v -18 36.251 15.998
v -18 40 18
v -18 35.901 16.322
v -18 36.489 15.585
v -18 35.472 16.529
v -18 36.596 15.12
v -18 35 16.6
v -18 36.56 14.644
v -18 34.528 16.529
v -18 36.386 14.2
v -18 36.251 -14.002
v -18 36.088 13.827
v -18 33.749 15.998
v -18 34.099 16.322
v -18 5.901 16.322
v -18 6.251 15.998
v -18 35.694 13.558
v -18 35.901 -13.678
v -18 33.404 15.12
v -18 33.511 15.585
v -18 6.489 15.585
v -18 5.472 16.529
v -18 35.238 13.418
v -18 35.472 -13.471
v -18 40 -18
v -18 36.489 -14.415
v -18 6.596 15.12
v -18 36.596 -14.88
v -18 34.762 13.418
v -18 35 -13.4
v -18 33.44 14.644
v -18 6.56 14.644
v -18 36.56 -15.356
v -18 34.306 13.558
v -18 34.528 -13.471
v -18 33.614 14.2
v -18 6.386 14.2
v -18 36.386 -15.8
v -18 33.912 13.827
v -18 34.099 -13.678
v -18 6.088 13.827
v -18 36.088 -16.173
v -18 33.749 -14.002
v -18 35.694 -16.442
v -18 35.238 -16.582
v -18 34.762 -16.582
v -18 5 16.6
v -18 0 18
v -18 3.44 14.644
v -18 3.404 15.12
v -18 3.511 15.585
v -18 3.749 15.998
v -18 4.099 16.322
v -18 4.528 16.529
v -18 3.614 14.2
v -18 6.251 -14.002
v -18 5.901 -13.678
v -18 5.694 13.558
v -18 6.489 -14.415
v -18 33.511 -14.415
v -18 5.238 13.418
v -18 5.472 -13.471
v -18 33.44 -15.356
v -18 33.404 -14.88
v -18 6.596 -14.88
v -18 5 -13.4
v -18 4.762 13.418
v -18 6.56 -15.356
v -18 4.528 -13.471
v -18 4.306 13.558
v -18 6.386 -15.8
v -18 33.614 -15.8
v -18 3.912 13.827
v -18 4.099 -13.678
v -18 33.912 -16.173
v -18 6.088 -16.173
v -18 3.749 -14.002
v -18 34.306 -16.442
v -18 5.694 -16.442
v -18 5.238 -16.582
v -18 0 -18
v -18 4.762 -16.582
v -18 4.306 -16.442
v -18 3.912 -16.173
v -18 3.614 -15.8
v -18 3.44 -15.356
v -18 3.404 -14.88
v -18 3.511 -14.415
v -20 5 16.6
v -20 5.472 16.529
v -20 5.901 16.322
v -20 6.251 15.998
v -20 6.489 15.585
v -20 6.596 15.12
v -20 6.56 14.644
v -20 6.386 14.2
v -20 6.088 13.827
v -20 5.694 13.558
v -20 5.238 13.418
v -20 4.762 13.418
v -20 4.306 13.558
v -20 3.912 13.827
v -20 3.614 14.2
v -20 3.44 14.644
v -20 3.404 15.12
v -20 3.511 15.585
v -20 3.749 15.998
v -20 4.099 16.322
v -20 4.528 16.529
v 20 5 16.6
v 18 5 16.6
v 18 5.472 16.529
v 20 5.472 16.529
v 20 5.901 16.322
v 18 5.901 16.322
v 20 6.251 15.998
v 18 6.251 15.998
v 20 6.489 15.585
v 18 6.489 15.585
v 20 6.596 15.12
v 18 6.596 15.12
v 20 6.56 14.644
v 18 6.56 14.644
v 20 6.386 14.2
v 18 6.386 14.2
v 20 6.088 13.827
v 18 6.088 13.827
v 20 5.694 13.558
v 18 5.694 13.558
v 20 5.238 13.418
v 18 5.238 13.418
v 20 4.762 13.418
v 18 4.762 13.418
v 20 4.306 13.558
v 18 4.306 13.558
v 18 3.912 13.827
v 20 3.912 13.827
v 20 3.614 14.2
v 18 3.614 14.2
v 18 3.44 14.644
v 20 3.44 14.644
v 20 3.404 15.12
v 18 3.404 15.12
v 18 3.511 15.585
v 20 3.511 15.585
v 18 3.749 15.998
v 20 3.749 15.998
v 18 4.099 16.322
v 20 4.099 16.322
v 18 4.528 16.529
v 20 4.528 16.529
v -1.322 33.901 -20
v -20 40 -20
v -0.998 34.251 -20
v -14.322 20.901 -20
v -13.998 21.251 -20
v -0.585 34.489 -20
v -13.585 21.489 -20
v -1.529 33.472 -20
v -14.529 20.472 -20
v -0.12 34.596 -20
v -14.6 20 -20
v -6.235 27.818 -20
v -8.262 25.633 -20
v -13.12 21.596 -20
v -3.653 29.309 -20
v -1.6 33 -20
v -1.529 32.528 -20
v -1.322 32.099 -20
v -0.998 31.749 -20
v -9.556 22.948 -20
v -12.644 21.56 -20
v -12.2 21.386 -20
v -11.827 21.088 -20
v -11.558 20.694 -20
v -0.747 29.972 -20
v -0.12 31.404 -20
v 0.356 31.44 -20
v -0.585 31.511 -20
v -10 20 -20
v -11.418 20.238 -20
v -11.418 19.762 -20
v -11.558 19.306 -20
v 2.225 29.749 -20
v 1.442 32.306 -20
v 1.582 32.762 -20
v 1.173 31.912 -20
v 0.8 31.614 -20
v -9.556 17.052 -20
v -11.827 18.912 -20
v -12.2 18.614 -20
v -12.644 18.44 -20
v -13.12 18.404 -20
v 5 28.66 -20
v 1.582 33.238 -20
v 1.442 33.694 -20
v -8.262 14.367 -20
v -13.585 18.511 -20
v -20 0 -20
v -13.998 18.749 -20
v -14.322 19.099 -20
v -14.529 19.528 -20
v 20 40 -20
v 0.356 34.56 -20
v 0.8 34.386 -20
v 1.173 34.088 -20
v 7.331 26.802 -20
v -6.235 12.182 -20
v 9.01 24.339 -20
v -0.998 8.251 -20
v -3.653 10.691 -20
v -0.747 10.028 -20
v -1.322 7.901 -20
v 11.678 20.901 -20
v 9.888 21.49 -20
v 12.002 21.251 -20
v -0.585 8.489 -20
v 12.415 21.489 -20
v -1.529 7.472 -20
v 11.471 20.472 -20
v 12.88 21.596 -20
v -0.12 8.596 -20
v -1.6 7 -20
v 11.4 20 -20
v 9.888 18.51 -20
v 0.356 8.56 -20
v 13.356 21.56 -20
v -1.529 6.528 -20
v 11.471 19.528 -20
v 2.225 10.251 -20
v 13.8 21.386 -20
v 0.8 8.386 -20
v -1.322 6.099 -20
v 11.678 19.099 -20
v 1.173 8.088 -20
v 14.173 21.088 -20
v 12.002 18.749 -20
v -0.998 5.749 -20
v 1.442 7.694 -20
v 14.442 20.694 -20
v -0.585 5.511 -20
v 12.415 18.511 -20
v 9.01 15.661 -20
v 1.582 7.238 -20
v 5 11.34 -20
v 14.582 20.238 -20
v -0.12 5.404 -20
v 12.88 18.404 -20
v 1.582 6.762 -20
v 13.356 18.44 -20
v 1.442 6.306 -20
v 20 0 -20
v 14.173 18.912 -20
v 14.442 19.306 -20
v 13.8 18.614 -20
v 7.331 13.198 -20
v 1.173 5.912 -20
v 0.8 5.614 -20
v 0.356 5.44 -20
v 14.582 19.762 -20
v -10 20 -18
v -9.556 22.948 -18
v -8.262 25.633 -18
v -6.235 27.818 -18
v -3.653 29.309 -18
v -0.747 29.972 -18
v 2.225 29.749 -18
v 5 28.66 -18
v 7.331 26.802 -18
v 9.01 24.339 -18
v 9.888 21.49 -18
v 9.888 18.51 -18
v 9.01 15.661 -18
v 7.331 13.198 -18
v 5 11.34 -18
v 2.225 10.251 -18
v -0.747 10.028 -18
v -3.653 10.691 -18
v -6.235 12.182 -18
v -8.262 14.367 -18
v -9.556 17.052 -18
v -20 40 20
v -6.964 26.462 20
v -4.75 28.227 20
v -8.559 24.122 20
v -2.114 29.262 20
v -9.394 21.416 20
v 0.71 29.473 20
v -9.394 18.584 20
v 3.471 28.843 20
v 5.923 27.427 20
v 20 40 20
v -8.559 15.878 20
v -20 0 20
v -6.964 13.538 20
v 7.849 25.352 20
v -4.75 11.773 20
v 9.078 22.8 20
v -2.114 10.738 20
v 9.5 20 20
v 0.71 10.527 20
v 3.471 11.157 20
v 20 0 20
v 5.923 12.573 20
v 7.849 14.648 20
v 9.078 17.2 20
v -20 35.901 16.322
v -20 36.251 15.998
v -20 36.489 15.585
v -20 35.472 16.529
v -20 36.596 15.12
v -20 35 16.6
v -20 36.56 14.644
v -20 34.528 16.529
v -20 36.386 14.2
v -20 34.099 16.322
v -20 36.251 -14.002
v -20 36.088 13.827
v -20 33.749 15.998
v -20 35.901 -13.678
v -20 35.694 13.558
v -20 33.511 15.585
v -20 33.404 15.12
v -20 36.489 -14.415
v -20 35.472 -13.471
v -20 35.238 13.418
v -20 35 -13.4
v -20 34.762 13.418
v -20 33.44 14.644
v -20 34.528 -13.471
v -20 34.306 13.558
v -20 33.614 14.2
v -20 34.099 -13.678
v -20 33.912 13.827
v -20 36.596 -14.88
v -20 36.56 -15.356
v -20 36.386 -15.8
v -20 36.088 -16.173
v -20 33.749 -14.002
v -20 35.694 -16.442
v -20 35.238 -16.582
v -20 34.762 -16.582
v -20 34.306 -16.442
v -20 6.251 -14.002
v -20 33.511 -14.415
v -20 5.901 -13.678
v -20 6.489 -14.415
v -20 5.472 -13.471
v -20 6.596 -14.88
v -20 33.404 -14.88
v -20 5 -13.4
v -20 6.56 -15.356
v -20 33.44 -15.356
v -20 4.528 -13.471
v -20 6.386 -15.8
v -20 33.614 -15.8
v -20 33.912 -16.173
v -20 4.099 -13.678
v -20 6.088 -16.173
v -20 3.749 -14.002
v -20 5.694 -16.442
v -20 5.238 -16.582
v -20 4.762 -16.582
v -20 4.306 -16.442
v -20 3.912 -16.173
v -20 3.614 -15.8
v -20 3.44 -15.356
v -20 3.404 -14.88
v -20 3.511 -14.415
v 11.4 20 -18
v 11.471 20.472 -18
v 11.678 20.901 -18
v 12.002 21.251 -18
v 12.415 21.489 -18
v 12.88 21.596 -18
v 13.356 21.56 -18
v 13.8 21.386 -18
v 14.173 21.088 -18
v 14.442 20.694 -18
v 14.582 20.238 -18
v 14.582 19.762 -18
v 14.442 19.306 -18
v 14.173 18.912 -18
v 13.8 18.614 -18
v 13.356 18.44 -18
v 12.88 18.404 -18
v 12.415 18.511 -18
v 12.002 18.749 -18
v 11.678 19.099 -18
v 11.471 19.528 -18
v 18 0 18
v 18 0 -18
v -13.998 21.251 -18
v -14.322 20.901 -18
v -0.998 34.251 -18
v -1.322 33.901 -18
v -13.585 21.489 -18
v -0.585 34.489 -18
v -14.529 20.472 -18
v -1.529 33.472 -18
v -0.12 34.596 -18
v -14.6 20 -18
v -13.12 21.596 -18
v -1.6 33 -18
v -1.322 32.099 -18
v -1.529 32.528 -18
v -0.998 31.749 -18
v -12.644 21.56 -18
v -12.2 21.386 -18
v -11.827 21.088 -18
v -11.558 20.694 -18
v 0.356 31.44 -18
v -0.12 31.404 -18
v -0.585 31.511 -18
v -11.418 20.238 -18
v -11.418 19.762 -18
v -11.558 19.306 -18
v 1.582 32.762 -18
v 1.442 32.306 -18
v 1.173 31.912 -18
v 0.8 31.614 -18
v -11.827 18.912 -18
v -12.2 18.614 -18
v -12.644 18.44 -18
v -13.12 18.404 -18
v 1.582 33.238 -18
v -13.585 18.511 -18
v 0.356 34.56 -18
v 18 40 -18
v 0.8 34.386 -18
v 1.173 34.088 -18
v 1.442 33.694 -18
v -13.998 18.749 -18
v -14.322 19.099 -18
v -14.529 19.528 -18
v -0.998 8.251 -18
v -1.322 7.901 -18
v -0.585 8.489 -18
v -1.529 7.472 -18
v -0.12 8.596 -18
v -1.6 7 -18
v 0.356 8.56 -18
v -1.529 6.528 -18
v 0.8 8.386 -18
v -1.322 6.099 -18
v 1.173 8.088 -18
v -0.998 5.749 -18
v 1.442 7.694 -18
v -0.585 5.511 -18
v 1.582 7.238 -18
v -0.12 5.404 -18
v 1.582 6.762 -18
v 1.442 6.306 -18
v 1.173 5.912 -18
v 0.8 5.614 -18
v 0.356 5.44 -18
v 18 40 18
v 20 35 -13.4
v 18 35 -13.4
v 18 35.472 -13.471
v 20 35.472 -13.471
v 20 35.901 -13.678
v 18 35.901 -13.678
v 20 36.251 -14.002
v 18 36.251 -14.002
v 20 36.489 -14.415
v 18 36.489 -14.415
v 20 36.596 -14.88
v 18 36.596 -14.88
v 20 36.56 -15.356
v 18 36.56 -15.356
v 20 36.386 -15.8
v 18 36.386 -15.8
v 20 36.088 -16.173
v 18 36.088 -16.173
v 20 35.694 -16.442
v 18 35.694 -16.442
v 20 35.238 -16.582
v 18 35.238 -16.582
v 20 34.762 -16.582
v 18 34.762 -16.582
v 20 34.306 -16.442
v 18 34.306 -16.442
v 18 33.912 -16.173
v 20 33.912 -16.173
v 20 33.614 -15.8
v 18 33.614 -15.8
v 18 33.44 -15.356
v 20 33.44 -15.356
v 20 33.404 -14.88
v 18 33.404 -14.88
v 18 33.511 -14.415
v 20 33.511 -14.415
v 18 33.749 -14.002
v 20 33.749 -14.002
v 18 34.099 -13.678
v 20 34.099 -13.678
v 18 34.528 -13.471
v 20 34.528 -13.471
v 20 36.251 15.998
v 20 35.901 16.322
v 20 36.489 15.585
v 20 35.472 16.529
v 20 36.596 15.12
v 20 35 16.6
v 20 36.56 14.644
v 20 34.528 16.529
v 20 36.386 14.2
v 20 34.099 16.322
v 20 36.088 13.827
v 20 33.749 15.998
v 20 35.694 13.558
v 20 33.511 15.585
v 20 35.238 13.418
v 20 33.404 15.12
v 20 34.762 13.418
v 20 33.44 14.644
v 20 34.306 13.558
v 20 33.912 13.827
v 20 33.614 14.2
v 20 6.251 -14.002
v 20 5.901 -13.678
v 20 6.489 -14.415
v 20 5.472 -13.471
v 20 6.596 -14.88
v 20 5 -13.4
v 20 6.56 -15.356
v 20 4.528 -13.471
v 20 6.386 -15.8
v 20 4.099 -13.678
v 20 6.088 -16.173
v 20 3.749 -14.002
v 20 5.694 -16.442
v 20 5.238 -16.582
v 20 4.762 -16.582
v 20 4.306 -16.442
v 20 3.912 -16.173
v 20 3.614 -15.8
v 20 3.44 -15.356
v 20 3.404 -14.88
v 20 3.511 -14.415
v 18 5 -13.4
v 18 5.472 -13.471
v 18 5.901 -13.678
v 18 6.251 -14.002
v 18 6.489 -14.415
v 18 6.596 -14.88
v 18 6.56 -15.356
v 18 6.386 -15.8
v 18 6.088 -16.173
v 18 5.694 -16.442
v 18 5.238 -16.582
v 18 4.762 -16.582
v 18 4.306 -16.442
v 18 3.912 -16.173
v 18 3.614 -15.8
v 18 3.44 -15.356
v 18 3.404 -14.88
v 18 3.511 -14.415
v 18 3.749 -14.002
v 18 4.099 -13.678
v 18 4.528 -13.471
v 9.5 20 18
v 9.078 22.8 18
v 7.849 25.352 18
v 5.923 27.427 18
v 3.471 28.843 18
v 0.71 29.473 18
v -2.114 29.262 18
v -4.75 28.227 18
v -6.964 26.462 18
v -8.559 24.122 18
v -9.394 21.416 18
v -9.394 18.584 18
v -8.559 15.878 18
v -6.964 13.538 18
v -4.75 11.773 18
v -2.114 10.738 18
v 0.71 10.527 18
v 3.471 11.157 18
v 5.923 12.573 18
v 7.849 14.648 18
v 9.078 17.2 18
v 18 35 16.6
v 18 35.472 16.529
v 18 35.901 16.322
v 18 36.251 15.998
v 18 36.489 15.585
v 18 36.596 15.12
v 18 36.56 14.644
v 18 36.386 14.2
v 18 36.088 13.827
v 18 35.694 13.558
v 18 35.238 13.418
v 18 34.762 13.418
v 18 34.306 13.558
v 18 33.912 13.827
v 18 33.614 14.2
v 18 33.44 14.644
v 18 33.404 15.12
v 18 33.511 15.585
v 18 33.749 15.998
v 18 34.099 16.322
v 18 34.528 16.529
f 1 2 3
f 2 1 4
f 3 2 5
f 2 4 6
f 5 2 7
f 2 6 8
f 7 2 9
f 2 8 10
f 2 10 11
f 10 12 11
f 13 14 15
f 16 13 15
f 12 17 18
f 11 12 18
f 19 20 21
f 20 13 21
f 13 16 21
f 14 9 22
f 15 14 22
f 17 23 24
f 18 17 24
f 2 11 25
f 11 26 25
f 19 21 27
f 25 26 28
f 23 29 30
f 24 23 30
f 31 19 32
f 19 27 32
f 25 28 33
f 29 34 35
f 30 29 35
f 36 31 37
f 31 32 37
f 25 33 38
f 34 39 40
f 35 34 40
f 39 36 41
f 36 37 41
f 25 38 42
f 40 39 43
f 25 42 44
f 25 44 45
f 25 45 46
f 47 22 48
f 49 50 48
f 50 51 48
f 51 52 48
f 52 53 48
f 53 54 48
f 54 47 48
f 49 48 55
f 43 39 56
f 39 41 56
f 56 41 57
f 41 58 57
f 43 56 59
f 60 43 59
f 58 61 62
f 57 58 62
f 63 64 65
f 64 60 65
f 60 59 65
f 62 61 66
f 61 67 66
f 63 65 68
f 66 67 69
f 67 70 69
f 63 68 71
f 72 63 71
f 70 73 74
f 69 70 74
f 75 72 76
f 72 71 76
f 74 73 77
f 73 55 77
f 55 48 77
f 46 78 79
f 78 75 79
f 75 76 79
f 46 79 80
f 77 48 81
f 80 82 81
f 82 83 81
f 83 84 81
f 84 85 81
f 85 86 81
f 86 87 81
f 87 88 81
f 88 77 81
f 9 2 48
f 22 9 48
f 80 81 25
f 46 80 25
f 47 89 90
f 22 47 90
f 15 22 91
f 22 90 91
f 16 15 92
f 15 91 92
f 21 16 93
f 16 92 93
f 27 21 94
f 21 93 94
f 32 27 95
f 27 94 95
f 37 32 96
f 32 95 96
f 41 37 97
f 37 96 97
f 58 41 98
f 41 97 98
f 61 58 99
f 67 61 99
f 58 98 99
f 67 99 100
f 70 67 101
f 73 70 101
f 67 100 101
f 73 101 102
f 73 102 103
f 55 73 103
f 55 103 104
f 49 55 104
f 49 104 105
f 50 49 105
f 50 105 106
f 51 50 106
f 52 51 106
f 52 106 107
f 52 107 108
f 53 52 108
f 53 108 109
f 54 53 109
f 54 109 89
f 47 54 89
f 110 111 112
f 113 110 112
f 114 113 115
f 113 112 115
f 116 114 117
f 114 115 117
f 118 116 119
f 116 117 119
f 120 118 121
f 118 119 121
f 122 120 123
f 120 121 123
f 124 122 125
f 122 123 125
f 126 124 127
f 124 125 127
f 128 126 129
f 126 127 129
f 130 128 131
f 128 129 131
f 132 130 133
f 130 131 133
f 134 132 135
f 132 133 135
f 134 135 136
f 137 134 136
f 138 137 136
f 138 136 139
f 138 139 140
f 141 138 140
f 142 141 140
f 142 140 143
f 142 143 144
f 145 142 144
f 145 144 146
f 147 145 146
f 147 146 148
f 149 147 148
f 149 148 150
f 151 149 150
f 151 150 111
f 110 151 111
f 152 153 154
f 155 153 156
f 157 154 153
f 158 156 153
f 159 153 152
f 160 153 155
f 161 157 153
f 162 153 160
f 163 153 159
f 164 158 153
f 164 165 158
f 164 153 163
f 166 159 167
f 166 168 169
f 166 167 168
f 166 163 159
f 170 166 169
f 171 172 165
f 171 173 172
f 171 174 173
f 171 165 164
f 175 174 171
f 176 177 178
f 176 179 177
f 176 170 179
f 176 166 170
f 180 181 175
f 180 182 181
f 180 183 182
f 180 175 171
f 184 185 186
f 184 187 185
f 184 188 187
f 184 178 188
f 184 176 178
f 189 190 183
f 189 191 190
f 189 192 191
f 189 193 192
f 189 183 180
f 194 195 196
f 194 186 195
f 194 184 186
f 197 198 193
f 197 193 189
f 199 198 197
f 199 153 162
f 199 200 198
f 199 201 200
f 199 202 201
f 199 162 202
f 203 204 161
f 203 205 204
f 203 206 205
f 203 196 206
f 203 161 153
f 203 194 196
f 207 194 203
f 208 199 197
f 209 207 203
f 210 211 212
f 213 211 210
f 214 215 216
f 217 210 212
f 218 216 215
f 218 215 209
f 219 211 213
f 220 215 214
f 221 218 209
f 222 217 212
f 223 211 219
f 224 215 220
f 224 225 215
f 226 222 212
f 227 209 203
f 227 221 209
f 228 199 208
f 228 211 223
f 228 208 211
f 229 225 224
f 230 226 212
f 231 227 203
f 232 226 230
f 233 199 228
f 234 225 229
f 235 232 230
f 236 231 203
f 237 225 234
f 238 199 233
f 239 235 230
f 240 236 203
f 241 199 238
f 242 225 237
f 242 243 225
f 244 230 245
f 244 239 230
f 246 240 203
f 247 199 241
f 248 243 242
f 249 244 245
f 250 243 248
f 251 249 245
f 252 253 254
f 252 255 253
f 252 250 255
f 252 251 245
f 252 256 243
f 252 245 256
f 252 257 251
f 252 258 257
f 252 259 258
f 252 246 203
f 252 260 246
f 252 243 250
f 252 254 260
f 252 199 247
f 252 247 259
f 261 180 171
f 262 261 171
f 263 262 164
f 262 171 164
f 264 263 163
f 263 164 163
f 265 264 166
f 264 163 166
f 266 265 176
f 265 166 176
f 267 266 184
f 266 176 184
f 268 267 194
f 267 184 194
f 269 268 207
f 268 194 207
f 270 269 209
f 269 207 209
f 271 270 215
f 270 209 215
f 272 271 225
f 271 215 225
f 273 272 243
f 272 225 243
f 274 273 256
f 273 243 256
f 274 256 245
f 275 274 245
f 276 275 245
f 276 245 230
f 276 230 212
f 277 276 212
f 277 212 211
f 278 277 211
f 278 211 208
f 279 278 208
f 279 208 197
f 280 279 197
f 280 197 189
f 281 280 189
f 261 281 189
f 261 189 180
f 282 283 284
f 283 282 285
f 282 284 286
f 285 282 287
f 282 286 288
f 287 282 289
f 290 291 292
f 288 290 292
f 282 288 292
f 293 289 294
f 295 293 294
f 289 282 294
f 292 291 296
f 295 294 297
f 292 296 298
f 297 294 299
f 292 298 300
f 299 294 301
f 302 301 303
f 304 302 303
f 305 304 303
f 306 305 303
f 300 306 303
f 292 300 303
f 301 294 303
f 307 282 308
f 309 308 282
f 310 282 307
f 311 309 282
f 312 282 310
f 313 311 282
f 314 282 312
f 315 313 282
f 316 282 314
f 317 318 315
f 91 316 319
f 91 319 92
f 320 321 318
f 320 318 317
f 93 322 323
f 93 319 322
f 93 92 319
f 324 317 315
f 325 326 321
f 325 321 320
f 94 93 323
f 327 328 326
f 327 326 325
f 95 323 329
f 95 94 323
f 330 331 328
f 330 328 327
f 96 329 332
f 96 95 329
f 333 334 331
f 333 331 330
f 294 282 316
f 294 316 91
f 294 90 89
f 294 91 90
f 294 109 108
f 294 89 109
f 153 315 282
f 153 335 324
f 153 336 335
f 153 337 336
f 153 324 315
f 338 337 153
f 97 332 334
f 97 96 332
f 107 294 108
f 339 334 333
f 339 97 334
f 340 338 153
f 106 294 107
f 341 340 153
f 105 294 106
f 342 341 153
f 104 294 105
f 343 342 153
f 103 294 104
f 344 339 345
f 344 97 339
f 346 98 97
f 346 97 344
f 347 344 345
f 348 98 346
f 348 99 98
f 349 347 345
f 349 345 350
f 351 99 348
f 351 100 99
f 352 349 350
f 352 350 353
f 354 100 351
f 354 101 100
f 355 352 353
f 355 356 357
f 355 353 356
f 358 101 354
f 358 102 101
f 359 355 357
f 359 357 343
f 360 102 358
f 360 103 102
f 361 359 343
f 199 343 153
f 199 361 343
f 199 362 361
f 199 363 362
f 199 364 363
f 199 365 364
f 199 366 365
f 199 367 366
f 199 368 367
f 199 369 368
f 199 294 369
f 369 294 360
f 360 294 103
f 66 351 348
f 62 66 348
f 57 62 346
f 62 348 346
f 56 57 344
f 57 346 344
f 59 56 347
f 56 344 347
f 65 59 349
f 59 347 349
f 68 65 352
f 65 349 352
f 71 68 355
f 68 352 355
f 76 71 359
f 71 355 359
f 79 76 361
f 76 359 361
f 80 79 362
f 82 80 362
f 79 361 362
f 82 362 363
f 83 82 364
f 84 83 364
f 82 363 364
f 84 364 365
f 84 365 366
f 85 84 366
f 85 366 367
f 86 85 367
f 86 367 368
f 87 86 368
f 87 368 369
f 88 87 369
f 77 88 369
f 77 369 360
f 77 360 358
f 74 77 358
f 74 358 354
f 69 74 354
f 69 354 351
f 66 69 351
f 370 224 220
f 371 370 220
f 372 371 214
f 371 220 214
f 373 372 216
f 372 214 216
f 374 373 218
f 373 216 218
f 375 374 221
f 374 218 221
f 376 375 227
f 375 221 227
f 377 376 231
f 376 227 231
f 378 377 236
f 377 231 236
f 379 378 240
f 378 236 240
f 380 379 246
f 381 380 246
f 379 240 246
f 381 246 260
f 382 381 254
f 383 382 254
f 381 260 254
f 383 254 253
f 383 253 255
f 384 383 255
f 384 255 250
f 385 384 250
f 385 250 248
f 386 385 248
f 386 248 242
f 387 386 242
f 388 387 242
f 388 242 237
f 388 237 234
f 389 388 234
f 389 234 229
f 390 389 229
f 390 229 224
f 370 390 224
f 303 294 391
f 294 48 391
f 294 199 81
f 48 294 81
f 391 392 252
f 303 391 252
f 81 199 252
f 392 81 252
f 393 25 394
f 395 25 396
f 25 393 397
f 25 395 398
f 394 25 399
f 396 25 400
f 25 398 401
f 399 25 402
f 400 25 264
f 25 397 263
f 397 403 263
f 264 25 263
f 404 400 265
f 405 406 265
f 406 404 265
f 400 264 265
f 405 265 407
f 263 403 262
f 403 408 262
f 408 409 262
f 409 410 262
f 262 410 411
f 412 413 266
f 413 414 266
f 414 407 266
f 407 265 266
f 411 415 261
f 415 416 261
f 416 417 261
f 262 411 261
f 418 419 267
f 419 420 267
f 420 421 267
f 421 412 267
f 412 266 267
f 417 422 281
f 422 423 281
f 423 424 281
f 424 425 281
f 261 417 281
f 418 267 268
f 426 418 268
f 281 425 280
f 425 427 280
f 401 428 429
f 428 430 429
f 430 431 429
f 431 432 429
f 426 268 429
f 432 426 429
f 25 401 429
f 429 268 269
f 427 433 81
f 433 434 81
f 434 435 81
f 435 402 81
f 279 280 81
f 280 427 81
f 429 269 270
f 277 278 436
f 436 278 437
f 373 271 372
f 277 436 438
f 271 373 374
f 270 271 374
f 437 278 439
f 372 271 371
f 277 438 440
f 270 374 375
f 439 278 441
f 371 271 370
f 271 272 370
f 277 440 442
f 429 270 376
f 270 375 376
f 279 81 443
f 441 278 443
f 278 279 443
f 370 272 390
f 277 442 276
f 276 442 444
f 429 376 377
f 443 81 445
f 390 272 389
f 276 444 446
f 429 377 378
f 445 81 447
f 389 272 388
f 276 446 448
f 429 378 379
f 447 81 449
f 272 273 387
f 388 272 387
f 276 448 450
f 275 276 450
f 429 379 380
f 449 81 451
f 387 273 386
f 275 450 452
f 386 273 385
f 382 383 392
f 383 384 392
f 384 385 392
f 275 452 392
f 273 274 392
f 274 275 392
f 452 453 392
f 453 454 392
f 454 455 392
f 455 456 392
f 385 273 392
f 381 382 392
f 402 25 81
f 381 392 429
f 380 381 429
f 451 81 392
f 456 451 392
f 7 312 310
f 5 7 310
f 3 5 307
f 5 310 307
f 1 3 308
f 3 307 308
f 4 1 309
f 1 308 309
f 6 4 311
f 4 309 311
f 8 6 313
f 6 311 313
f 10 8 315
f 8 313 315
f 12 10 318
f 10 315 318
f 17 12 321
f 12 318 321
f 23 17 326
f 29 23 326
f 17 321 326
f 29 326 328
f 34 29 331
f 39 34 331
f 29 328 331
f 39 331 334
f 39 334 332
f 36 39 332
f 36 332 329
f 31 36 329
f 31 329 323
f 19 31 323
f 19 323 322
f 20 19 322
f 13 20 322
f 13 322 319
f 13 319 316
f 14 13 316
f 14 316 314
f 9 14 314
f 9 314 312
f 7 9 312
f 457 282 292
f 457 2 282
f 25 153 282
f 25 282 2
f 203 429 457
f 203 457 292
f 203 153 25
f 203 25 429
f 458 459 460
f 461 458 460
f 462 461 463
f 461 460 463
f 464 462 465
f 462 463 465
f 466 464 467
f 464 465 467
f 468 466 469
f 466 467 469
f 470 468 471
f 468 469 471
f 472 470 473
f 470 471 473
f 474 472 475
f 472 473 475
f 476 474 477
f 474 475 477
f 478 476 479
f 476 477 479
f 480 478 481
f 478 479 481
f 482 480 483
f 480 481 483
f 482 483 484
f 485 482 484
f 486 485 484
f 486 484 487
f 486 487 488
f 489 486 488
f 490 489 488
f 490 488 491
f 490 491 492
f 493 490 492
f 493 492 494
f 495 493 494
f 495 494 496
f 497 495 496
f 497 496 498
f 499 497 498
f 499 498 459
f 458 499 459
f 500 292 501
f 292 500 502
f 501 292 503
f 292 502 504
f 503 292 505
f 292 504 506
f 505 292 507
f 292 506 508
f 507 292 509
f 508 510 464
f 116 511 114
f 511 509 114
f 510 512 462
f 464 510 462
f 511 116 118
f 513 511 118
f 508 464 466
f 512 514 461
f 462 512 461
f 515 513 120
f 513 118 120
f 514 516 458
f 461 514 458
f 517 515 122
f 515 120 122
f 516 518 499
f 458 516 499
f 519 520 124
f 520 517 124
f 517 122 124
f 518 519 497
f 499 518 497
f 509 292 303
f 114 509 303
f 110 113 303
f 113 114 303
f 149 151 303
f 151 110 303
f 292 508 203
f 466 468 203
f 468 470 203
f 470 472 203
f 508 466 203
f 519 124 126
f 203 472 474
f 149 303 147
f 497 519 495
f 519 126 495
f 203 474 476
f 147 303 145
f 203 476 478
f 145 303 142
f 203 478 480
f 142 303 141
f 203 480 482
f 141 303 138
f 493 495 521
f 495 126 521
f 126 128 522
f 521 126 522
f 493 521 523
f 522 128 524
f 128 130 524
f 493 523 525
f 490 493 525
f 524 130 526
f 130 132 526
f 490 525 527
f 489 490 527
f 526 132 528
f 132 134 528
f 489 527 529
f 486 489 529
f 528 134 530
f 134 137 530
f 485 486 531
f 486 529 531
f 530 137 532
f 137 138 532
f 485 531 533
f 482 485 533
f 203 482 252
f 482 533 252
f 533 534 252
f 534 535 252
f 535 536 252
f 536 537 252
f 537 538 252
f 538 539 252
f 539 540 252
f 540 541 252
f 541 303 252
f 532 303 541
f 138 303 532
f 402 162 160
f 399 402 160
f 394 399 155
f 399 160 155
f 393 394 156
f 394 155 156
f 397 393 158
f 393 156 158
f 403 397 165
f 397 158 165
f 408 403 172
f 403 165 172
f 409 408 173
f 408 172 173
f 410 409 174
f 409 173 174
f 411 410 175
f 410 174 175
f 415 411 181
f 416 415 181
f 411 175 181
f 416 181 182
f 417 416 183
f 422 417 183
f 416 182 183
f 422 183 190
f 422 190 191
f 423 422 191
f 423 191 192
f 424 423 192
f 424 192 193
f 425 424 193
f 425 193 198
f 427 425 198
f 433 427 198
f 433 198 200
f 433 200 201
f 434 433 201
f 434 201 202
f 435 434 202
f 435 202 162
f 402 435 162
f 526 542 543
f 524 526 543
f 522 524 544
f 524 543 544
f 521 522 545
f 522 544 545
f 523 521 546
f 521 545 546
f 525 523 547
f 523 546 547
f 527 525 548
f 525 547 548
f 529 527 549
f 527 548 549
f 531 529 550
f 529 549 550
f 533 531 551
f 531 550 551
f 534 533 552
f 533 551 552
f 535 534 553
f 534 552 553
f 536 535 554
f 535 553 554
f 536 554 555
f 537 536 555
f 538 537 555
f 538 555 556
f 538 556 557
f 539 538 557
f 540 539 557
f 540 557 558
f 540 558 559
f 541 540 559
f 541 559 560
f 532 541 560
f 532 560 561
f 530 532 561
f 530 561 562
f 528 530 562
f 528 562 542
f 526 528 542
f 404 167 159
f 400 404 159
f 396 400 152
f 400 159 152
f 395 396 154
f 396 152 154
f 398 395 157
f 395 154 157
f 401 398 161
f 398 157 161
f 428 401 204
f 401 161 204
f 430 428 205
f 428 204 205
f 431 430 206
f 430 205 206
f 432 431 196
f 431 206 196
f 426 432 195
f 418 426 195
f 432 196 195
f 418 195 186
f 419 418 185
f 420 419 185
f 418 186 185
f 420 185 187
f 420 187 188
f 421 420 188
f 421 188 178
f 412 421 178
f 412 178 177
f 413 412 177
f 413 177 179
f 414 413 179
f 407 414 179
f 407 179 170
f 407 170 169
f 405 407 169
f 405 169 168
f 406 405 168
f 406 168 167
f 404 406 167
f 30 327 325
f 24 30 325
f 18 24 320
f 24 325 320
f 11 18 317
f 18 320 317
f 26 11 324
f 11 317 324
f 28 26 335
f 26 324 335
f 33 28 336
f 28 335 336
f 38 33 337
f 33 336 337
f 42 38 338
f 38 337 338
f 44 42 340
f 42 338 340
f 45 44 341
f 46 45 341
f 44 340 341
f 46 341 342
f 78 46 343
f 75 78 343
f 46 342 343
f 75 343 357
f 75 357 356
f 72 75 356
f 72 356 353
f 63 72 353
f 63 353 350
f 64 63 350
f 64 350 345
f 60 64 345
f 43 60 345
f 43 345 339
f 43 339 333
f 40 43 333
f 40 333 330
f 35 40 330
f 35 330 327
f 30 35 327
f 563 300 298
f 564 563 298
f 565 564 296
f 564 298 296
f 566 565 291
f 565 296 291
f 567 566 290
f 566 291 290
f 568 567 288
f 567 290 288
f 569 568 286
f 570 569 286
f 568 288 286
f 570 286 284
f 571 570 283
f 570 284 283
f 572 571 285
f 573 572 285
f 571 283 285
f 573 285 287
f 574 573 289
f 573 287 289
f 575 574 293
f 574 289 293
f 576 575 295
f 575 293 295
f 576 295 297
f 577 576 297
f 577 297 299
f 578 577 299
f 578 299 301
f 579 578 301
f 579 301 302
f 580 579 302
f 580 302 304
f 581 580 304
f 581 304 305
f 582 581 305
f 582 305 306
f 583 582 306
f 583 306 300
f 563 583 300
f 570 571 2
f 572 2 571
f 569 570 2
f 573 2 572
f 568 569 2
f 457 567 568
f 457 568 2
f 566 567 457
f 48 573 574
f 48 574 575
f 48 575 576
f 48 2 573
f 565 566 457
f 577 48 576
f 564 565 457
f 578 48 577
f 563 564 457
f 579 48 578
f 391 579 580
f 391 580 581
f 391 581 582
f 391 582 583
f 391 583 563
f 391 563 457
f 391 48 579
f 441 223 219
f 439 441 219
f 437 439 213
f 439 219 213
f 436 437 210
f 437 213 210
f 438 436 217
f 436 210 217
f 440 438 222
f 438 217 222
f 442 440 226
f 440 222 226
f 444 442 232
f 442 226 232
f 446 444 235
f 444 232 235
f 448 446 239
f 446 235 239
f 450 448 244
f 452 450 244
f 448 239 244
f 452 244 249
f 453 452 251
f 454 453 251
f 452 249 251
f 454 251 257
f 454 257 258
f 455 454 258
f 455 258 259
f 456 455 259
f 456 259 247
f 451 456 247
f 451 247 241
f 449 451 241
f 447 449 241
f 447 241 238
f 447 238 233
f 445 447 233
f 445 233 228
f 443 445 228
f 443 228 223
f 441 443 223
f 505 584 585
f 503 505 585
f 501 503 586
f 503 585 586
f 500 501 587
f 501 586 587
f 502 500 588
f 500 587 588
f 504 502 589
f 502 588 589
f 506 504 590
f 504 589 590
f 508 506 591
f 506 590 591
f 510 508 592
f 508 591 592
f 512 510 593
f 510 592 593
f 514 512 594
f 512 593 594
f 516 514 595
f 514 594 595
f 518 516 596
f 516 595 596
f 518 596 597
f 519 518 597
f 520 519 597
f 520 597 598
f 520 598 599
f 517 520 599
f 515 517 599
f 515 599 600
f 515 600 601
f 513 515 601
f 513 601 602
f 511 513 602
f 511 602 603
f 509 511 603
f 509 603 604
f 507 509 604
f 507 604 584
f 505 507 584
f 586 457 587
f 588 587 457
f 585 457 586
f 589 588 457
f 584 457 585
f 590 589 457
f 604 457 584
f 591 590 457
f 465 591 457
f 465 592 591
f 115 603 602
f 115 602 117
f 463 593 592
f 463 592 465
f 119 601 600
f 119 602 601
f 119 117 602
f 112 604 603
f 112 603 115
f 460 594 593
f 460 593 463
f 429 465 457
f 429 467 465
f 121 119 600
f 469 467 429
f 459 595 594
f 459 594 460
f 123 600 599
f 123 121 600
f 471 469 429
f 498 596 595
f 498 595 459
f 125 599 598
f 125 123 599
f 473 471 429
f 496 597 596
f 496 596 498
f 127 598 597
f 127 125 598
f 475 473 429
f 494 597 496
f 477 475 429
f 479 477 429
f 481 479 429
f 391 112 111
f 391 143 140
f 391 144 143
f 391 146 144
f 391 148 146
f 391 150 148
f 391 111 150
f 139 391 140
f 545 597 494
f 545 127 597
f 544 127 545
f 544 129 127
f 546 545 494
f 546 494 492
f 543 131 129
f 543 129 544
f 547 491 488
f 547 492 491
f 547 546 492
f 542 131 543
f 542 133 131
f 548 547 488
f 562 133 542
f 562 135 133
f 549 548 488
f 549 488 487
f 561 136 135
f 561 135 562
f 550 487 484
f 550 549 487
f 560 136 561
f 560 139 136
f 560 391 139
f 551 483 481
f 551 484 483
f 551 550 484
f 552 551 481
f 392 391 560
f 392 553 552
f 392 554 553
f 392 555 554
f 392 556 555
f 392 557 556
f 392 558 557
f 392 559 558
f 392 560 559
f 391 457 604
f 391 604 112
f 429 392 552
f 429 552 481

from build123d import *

# Parameters (mm, degrees)
SKETCH_1_W          = 40
SKETCH_1_H          = 40
SKETCH_1_W_2        = 36
SKETCH_1_H_2        = 36
EXTRUDE_1_DEPTH     = 40
CUT_EXTRUDE_1_REACH = 62
SKETCH_2_R          = 10
SKETCH_2_R_2        = 1.6
CUT_EXTRUDE_2_REACH = 62
SKETCH_3_R          = 9.5
SKETCH_4_R          = 1.6
CUT_EXTRUDE_3_DEPTH = 61


with BuildPart() as part:
    # ｽｹｯﾁ1 → ﾎﾞｽ - 押し出し1 (new body)
    with BuildSketch(Plane(origin=(0, 0, 0), x_dir=(1, 0, 0), z_dir=(0, 1, 0))):
        Rectangle(SKETCH_1_W, SKETCH_1_H)
        Rectangle(SKETCH_1_W_2, SKETCH_1_H_2, mode=Mode.SUBTRACT)
    extrude(amount=EXTRUDE_1_DEPTH)

    # ｽｹｯﾁ2 → ｶｯﾄ - 押し出し1 (cut, up to next)
    with BuildSketch(Plane(origin=(0, 0, -20), x_dir=(-1, 0, 0), z_dir=(0, 0, -1)), mode=Mode.PRIVATE) as cut_extrude_1_sk1:
        with Locations((0, 20)):
            Circle(SKETCH_2_R)
    cut_extrude_1_tool1 = extrude(cut_extrude_1_sk1.sketch, amount=-CUT_EXTRUDE_1_REACH, mode=Mode.PRIVATE) & part.part
    # ｽｹｯﾁ2 → ｶｯﾄ - 押し出し1 (cut, up to next)
    with BuildSketch(Plane(origin=(0, 0, -20), x_dir=(-1, 0, 0), z_dir=(0, 0, -1)), mode=Mode.PRIVATE) as cut_extrude_1_sk2:
        with Locations((0, 33)):
            Circle(SKETCH_2_R_2)
    cut_extrude_1_tool2 = extrude(cut_extrude_1_sk2.sketch, amount=-CUT_EXTRUDE_1_REACH, mode=Mode.PRIVATE) & part.part
    # ｽｹｯﾁ2 → ｶｯﾄ - 押し出し1 (cut, up to next)
    with BuildSketch(Plane(origin=(0, 0, -20), x_dir=(-1, 0, 0), z_dir=(0, 0, -1)), mode=Mode.PRIVATE) as cut_extrude_1_sk3:
        with Locations((13, 20)):
            Circle(SKETCH_2_R_2)
    cut_extrude_1_tool3 = extrude(cut_extrude_1_sk3.sketch, amount=-CUT_EXTRUDE_1_REACH, mode=Mode.PRIVATE) & part.part
    # ｽｹｯﾁ2 → ｶｯﾄ - 押し出し1 (cut, up to next)
    with BuildSketch(Plane(origin=(0, 0, -20), x_dir=(-1, 0, 0), z_dir=(0, 0, -1)), mode=Mode.PRIVATE) as cut_extrude_1_sk4:
        with Locations((0, 7)):
            Circle(SKETCH_2_R_2)
    cut_extrude_1_tool4 = extrude(cut_extrude_1_sk4.sketch, amount=-CUT_EXTRUDE_1_REACH, mode=Mode.PRIVATE) & part.part
    # ｽｹｯﾁ2 → ｶｯﾄ - 押し出し1 (cut, up to next)
    with BuildSketch(Plane(origin=(0, 0, -20), x_dir=(-1, 0, 0), z_dir=(0, 0, -1)), mode=Mode.PRIVATE) as cut_extrude_1_sk5:
        with Locations((-13, 20)):
            Circle(SKETCH_2_R_2)
    cut_extrude_1_tool5 = extrude(cut_extrude_1_sk5.sketch, amount=-CUT_EXTRUDE_1_REACH, mode=Mode.PRIVATE) & part.part
    add(cut_extrude_1_tool1.solids().sort_by_distance((0, 20, -20))[0], mode=Mode.SUBTRACT)
    add(cut_extrude_1_tool2.solids().sort_by_distance((0, 33, -20))[0], mode=Mode.SUBTRACT)
    add(cut_extrude_1_tool3.solids().sort_by_distance((-13, 20, -20))[0], mode=Mode.SUBTRACT)
    add(cut_extrude_1_tool4.solids().sort_by_distance((0, 7, -20))[0], mode=Mode.SUBTRACT)
    add(cut_extrude_1_tool5.solids().sort_by_distance((13, 20, -20))[0], mode=Mode.SUBTRACT)

    # ｽｹｯﾁ3 → ｶｯﾄ - 押し出し2 (cut, up to next)
    with BuildSketch(Plane.XY.offset(20), mode=Mode.PRIVATE) as cut_extrude_2_sk1:
        with Locations((0, 20)):
            Circle(SKETCH_3_R)
    cut_extrude_2_tool1 = extrude(cut_extrude_2_sk1.sketch, amount=-CUT_EXTRUDE_2_REACH, mode=Mode.PRIVATE) & part.part
    add(cut_extrude_2_tool1.solids().sort_by_distance((0, 20, 20))[0], mode=Mode.SUBTRACT)

    # ｽｹｯﾁ4 → ｶｯﾄ - 押し出し3 (cut, through all)
    with BuildSketch(Plane.ZY.offset(20)):
        with Locations((15, 5)):
            Circle(SKETCH_4_R)
        with Locations((-15, 5)):
            Circle(SKETCH_4_R)
        with Locations((15, 35)):
            Circle(SKETCH_4_R)
        with Locations((-15, 35)):
            Circle(SKETCH_4_R)
    extrude(amount=-CUT_EXTRUDE_3_DEPTH, mode=Mode.SUBTRACT)


solid = part.part
